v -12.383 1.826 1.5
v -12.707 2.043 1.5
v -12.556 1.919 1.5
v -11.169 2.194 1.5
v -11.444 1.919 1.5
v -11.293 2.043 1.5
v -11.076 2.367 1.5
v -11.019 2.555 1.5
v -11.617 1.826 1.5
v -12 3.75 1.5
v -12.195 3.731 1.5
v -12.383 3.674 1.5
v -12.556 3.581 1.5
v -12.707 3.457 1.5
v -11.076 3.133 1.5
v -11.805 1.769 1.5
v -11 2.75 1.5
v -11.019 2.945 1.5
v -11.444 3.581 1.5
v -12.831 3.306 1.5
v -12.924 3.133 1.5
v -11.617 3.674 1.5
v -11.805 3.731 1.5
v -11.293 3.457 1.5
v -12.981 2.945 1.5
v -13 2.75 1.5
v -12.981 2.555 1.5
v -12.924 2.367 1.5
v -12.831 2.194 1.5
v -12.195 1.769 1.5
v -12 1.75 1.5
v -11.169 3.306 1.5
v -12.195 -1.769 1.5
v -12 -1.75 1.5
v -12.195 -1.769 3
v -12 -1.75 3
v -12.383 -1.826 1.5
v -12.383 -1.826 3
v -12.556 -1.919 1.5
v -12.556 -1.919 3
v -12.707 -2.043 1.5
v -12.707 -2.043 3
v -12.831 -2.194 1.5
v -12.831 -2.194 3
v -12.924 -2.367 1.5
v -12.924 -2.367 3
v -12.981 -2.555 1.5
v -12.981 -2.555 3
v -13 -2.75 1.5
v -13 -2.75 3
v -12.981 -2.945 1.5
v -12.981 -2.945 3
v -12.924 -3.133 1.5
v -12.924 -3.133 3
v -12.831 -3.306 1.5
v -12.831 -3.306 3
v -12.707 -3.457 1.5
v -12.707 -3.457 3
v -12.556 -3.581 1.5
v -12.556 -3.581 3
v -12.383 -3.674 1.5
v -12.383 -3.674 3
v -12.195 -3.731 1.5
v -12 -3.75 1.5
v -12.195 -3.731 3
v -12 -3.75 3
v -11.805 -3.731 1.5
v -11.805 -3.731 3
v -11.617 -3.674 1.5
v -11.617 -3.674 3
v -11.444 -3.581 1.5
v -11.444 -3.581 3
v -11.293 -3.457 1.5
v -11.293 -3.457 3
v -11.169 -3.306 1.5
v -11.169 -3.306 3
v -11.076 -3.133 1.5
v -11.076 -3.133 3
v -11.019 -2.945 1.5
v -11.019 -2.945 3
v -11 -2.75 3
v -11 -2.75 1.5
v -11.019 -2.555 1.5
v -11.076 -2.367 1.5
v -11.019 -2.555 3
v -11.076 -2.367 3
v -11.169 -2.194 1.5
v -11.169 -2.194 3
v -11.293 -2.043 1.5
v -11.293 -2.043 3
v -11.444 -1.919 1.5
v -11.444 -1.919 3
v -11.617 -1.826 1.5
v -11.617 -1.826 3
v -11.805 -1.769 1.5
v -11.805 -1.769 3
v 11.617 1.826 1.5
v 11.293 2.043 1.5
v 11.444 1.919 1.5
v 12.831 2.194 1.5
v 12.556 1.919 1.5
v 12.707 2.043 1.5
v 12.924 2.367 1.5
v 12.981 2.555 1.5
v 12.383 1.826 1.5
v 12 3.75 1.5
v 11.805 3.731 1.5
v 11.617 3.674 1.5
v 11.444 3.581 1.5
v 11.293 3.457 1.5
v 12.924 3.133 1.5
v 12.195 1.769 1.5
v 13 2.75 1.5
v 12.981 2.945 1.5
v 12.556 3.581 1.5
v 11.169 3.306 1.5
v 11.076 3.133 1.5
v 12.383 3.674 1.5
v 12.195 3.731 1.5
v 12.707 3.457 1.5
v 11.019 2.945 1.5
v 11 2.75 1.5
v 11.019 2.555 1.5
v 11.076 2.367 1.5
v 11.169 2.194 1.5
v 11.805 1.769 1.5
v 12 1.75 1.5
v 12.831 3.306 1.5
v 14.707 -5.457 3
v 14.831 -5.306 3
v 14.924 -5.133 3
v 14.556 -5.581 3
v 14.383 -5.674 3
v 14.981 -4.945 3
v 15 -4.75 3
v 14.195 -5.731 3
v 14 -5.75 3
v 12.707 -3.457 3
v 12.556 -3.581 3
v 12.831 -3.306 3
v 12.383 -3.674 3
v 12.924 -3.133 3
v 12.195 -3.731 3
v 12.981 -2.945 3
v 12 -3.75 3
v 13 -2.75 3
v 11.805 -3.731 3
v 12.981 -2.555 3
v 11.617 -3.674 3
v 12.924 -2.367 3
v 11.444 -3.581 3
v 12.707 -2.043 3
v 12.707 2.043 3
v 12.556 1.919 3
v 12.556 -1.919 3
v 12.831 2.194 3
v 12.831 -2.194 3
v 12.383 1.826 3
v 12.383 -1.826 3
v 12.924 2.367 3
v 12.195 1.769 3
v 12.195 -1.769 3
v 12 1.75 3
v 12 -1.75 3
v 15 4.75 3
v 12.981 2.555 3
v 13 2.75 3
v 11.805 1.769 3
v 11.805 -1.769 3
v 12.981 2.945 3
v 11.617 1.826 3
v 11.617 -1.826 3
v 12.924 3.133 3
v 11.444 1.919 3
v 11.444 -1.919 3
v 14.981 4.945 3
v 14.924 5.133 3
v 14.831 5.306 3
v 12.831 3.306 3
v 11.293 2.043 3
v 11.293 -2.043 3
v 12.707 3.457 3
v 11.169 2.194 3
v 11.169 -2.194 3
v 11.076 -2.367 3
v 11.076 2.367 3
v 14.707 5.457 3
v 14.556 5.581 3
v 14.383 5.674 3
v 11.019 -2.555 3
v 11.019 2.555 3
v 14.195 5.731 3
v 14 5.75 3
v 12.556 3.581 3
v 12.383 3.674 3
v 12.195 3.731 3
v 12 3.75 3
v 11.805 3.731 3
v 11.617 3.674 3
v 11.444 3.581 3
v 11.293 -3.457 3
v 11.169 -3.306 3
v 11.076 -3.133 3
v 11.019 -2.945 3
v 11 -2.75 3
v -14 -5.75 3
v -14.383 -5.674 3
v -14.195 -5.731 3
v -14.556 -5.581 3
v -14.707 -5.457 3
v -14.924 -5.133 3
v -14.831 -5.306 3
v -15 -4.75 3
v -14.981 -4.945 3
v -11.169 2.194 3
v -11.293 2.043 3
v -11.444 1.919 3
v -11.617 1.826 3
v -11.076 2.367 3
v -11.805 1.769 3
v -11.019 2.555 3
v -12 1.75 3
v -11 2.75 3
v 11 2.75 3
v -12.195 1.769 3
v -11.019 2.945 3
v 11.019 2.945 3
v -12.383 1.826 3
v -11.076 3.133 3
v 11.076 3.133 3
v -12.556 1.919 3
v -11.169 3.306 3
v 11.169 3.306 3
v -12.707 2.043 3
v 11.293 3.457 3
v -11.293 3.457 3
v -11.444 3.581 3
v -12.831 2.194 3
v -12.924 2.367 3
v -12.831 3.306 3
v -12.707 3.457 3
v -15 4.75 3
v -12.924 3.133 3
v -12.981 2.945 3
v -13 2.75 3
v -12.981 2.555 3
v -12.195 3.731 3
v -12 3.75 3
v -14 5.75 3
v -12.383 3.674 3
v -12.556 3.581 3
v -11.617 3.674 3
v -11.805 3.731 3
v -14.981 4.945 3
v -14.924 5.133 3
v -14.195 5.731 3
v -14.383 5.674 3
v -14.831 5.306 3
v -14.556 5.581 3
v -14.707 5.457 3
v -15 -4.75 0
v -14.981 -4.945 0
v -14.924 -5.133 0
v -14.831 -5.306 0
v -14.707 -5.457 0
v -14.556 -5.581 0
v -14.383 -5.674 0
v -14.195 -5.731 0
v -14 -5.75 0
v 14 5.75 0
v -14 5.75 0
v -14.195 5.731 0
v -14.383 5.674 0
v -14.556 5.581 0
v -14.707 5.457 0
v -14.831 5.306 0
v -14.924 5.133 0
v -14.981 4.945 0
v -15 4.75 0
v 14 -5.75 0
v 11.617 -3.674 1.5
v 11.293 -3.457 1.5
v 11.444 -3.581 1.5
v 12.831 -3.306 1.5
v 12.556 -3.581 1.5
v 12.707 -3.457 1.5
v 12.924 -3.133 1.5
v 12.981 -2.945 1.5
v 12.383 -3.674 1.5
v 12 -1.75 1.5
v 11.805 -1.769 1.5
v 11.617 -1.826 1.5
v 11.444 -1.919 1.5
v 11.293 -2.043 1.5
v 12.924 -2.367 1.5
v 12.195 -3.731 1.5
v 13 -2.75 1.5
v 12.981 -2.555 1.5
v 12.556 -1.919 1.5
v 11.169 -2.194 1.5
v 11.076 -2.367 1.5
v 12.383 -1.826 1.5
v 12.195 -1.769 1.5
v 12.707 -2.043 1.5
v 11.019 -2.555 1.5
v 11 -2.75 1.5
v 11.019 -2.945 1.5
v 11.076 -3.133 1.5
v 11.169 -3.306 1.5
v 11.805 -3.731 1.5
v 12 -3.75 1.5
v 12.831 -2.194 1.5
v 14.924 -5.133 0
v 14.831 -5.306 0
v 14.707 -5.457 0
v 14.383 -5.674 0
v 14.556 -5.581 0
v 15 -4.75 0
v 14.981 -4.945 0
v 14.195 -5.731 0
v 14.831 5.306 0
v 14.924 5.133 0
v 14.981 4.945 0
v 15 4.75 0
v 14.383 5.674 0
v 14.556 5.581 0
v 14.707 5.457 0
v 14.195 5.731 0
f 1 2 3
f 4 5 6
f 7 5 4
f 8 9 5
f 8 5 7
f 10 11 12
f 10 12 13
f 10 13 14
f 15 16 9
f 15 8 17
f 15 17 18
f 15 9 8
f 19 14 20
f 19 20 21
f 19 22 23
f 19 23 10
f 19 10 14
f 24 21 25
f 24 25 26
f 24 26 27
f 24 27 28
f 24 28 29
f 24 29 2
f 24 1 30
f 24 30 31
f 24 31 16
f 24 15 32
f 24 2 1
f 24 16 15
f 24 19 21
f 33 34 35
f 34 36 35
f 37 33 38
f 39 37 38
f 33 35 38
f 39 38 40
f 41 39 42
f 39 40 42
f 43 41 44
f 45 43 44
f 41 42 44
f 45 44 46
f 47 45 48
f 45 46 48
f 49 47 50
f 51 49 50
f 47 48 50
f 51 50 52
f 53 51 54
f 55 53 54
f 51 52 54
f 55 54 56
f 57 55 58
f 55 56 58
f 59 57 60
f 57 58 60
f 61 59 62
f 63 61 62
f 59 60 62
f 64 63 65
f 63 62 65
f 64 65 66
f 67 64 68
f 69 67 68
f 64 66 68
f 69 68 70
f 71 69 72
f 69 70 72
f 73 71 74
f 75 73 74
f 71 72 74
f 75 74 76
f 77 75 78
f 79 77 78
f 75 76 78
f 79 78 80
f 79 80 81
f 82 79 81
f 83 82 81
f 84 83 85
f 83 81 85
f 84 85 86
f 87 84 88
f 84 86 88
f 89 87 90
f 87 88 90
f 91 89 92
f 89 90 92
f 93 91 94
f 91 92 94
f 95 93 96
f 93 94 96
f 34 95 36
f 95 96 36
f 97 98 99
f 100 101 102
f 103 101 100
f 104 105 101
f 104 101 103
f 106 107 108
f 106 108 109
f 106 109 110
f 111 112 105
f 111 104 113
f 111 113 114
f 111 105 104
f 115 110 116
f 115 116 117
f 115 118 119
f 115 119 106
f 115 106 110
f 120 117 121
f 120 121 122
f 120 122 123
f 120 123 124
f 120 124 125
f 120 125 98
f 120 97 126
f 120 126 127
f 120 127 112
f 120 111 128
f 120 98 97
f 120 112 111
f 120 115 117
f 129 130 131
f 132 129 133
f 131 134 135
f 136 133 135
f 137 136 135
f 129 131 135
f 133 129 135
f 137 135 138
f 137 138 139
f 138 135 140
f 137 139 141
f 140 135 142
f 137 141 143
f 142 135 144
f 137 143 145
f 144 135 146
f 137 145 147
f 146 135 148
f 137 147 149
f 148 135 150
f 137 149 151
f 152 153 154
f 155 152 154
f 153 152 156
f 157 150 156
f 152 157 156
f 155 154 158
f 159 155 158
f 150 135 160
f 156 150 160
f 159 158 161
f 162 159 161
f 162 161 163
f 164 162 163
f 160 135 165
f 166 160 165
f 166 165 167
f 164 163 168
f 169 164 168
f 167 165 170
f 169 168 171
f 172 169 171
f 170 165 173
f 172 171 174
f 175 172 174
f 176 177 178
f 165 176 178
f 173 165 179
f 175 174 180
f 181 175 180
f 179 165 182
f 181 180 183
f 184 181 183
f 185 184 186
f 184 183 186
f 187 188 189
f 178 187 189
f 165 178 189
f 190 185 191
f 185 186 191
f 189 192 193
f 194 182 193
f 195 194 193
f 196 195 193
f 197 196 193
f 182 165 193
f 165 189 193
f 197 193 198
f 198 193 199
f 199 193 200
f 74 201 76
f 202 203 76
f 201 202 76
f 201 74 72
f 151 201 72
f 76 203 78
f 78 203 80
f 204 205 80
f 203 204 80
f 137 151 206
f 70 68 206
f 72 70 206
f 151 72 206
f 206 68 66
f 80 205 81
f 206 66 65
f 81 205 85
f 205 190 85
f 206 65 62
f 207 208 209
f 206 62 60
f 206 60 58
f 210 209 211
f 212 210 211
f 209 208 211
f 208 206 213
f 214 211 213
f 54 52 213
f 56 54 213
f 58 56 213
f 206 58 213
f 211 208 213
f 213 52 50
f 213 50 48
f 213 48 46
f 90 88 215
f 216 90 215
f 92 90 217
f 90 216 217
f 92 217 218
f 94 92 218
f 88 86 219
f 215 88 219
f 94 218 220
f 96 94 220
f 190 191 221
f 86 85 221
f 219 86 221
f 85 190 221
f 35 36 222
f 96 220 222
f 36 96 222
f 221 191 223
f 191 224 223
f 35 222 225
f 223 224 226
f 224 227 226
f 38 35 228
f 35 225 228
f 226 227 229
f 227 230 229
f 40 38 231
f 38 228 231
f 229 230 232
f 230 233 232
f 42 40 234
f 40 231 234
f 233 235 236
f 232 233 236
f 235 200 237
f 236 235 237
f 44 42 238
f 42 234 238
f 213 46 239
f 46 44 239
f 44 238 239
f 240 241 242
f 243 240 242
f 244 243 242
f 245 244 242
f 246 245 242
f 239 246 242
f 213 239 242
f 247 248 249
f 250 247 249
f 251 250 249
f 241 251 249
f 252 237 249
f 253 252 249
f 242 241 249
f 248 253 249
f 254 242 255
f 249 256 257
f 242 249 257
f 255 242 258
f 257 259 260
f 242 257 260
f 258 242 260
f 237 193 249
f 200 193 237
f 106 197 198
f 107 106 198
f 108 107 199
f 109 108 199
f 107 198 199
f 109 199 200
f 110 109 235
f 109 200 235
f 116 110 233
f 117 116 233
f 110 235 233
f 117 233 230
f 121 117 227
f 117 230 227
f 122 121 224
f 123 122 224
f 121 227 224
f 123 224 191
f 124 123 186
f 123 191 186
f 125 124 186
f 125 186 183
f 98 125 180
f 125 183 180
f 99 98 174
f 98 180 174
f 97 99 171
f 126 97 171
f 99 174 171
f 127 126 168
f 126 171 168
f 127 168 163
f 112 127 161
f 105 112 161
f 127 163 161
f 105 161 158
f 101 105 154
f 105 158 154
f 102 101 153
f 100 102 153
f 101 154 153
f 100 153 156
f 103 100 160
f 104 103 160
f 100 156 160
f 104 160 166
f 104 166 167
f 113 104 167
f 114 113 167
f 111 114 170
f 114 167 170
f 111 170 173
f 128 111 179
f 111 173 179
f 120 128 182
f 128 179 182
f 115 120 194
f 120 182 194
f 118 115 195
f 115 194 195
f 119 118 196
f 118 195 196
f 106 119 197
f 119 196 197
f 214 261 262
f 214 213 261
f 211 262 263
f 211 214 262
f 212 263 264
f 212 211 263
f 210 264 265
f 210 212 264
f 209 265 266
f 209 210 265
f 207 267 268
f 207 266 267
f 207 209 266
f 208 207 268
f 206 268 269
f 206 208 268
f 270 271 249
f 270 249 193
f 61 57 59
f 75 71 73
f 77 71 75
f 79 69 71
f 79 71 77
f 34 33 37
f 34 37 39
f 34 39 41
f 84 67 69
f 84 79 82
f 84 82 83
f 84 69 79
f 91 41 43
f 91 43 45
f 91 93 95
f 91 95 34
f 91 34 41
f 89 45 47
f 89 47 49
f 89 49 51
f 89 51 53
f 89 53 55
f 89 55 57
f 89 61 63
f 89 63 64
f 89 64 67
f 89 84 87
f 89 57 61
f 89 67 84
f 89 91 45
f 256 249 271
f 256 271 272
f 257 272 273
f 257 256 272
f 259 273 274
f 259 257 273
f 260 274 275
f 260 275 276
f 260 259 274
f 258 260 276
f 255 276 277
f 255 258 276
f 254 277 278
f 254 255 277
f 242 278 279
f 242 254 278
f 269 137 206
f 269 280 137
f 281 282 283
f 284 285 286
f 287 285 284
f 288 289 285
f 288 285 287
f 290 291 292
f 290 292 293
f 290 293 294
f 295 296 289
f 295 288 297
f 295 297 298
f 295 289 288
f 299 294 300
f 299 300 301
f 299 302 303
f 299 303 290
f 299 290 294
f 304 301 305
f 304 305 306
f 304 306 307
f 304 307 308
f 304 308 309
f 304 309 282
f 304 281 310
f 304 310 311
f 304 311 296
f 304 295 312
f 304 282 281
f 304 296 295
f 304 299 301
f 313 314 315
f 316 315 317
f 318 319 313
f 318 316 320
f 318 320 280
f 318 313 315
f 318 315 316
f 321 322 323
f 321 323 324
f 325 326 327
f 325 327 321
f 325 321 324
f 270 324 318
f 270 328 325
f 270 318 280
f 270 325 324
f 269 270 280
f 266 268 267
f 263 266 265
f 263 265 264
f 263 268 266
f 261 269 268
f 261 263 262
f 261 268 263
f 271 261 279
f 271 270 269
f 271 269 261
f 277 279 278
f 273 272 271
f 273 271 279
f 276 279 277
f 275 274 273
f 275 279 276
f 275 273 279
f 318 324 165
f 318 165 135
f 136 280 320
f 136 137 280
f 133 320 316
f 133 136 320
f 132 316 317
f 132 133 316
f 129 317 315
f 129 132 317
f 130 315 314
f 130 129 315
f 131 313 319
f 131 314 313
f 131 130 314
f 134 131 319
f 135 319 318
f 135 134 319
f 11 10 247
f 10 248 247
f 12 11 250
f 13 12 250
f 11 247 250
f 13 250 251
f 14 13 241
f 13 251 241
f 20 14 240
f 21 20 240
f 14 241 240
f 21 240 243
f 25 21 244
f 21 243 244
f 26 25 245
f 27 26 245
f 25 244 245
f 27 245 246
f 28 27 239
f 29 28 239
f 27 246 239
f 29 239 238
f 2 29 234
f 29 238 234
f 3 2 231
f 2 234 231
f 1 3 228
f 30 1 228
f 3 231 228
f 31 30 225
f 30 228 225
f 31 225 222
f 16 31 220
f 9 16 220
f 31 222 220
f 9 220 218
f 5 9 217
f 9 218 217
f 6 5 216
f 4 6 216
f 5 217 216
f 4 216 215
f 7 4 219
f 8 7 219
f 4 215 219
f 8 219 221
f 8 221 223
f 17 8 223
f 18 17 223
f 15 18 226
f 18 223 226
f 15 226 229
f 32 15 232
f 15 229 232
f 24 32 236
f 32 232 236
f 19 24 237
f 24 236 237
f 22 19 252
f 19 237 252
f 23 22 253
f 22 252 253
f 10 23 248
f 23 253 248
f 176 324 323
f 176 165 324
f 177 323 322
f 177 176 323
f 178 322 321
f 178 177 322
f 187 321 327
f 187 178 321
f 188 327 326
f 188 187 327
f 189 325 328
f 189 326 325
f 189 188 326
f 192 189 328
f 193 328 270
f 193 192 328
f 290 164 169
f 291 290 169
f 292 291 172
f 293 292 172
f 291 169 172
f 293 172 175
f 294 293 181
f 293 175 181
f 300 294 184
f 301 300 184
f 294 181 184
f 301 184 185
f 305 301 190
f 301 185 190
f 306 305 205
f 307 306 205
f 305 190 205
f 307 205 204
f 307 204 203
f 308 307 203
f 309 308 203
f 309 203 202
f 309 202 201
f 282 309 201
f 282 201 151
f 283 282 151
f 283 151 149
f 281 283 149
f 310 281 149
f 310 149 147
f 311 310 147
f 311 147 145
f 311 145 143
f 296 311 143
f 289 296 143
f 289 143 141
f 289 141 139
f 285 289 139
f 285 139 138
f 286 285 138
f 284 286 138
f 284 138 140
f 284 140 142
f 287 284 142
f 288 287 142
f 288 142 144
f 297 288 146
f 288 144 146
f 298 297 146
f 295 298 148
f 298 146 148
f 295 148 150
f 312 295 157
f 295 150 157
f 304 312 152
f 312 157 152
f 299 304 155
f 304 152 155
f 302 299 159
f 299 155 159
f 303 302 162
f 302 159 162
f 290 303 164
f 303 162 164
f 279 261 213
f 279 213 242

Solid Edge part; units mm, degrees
sketch "Sketch1" plane through (0, 0, 0) normal (0, 0, 1) x (1, 0, 0)
  line L0 (-15, 5.75) -> (15, 5.75)
  line L1 (15, 5.75) -> (15, -5.75)
  line L2 (15, -5.75) -> (-15, -5.75)
  line L3 (-15, -5.75) -> (-15, 5.75)
  dimension "D1" = 30
  dimension "D2" = 11.5
extrude "Protrusion1" add sketch "Sketch1" along normal blind 3
fillet "Avrundningar_1" radius 1 4 edges at (-15, -5.75, 1.5) (15, -5.75, 1.5) (15, 5.75, 1.5) (-15, 5.75, 1.5)
sketch "Sketch2" plane through (0, 0, 3) normal (0, 0, 1) x (0, 1, 0)
  circle A0 centre (-2.75, 12) radius 1
  circle A1 centre (2.75, 12) radius 1
  circle A2 centre (2.75, -12) radius 1
  circle A3 centre (-2.75, -12) radius 1
  dimension "D1" = 3
  dimension "D2" = 3
  dimension "D3" = 3
  dimension "D4" = 3
  dimension "D5" = 2
extrude "Utskärning_fäste_fjädrar" cut sketch "Sketch2" against normal blind 1.5
